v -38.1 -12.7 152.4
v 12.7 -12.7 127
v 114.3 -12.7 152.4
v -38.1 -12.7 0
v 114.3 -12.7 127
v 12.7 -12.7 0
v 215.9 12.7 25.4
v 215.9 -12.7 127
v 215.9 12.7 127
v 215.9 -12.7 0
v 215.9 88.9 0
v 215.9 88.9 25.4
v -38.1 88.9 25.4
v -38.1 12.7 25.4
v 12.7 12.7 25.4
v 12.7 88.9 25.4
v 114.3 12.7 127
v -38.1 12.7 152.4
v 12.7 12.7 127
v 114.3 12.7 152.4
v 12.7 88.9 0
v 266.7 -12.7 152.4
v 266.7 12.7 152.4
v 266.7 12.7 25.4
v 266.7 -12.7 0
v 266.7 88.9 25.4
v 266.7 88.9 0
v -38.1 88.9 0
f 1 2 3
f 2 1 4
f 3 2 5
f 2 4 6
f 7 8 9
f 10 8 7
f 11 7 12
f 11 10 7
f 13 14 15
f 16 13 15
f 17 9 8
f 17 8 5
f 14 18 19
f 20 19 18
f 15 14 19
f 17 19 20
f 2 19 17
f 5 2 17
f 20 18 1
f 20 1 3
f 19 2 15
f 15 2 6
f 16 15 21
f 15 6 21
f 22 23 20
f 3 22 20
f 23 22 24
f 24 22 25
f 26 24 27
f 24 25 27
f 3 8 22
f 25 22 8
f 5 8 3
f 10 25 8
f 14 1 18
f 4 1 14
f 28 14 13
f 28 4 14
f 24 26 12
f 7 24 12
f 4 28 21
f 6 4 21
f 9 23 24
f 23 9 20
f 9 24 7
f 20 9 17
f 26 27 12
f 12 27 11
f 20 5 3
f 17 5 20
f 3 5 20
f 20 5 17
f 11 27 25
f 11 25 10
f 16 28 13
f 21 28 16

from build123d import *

# Parameters (mm, degrees)
F0_W     = 25.4
F0_H     = 25.4
F1_DEPTH = 127
F2_W     = 127
F2_H     = 25.4
F3_DEPTH = 25.4
F5_DEPTH = 25.4
F6_W     = 25.4
F6_H     = 25.4
F7_DEPTH = 127


with BuildPart() as f1:
    # F0 (on Top) → F1 (new body)
    with BuildSketch(Plane.XY):
        Rectangle(F0_W, F0_H)
    extrude(amount=F1_DEPTH)

    # F2 (on face) → F3 (join)
    with BuildSketch(Plane.XY.offset(127)):
        with Locations((50.8, 0)):
            Rectangle(F2_W, F2_H)
    extrude(amount=F3_DEPTH)

    # F4 (on face) → F5 (join)
    with BuildSketch(Plane(origin=(0, 0, 0), x_dir=(1, 0, 0), z_dir=(0, 0, -1))):
        Polygon((-12.7, -12.7), (-12.7, 12.7), (-38.1, 12.7), (-38.1, -88.9), (12.7, -88.9), (12.7, -12.7), align=None)
    extrude(amount=-F5_DEPTH)

    # F6 (on face) → F7 (join)
    with BuildSketch(Plane.XY.offset(25.4)):
        with Locations((-25.4, 0)):
            Rectangle(F6_W, F6_H)
    extrude(amount=F7_DEPTH)


with BuildPart() as f8_1:
    # F8: instance of F1
    add(f1.part.mirror(Plane(origin=(114.3, 0, 139.7), x_dir=(0, 1, 0), z_dir=(1, 0, 0))))


solid = Compound([f1.part, f8_1.part])
